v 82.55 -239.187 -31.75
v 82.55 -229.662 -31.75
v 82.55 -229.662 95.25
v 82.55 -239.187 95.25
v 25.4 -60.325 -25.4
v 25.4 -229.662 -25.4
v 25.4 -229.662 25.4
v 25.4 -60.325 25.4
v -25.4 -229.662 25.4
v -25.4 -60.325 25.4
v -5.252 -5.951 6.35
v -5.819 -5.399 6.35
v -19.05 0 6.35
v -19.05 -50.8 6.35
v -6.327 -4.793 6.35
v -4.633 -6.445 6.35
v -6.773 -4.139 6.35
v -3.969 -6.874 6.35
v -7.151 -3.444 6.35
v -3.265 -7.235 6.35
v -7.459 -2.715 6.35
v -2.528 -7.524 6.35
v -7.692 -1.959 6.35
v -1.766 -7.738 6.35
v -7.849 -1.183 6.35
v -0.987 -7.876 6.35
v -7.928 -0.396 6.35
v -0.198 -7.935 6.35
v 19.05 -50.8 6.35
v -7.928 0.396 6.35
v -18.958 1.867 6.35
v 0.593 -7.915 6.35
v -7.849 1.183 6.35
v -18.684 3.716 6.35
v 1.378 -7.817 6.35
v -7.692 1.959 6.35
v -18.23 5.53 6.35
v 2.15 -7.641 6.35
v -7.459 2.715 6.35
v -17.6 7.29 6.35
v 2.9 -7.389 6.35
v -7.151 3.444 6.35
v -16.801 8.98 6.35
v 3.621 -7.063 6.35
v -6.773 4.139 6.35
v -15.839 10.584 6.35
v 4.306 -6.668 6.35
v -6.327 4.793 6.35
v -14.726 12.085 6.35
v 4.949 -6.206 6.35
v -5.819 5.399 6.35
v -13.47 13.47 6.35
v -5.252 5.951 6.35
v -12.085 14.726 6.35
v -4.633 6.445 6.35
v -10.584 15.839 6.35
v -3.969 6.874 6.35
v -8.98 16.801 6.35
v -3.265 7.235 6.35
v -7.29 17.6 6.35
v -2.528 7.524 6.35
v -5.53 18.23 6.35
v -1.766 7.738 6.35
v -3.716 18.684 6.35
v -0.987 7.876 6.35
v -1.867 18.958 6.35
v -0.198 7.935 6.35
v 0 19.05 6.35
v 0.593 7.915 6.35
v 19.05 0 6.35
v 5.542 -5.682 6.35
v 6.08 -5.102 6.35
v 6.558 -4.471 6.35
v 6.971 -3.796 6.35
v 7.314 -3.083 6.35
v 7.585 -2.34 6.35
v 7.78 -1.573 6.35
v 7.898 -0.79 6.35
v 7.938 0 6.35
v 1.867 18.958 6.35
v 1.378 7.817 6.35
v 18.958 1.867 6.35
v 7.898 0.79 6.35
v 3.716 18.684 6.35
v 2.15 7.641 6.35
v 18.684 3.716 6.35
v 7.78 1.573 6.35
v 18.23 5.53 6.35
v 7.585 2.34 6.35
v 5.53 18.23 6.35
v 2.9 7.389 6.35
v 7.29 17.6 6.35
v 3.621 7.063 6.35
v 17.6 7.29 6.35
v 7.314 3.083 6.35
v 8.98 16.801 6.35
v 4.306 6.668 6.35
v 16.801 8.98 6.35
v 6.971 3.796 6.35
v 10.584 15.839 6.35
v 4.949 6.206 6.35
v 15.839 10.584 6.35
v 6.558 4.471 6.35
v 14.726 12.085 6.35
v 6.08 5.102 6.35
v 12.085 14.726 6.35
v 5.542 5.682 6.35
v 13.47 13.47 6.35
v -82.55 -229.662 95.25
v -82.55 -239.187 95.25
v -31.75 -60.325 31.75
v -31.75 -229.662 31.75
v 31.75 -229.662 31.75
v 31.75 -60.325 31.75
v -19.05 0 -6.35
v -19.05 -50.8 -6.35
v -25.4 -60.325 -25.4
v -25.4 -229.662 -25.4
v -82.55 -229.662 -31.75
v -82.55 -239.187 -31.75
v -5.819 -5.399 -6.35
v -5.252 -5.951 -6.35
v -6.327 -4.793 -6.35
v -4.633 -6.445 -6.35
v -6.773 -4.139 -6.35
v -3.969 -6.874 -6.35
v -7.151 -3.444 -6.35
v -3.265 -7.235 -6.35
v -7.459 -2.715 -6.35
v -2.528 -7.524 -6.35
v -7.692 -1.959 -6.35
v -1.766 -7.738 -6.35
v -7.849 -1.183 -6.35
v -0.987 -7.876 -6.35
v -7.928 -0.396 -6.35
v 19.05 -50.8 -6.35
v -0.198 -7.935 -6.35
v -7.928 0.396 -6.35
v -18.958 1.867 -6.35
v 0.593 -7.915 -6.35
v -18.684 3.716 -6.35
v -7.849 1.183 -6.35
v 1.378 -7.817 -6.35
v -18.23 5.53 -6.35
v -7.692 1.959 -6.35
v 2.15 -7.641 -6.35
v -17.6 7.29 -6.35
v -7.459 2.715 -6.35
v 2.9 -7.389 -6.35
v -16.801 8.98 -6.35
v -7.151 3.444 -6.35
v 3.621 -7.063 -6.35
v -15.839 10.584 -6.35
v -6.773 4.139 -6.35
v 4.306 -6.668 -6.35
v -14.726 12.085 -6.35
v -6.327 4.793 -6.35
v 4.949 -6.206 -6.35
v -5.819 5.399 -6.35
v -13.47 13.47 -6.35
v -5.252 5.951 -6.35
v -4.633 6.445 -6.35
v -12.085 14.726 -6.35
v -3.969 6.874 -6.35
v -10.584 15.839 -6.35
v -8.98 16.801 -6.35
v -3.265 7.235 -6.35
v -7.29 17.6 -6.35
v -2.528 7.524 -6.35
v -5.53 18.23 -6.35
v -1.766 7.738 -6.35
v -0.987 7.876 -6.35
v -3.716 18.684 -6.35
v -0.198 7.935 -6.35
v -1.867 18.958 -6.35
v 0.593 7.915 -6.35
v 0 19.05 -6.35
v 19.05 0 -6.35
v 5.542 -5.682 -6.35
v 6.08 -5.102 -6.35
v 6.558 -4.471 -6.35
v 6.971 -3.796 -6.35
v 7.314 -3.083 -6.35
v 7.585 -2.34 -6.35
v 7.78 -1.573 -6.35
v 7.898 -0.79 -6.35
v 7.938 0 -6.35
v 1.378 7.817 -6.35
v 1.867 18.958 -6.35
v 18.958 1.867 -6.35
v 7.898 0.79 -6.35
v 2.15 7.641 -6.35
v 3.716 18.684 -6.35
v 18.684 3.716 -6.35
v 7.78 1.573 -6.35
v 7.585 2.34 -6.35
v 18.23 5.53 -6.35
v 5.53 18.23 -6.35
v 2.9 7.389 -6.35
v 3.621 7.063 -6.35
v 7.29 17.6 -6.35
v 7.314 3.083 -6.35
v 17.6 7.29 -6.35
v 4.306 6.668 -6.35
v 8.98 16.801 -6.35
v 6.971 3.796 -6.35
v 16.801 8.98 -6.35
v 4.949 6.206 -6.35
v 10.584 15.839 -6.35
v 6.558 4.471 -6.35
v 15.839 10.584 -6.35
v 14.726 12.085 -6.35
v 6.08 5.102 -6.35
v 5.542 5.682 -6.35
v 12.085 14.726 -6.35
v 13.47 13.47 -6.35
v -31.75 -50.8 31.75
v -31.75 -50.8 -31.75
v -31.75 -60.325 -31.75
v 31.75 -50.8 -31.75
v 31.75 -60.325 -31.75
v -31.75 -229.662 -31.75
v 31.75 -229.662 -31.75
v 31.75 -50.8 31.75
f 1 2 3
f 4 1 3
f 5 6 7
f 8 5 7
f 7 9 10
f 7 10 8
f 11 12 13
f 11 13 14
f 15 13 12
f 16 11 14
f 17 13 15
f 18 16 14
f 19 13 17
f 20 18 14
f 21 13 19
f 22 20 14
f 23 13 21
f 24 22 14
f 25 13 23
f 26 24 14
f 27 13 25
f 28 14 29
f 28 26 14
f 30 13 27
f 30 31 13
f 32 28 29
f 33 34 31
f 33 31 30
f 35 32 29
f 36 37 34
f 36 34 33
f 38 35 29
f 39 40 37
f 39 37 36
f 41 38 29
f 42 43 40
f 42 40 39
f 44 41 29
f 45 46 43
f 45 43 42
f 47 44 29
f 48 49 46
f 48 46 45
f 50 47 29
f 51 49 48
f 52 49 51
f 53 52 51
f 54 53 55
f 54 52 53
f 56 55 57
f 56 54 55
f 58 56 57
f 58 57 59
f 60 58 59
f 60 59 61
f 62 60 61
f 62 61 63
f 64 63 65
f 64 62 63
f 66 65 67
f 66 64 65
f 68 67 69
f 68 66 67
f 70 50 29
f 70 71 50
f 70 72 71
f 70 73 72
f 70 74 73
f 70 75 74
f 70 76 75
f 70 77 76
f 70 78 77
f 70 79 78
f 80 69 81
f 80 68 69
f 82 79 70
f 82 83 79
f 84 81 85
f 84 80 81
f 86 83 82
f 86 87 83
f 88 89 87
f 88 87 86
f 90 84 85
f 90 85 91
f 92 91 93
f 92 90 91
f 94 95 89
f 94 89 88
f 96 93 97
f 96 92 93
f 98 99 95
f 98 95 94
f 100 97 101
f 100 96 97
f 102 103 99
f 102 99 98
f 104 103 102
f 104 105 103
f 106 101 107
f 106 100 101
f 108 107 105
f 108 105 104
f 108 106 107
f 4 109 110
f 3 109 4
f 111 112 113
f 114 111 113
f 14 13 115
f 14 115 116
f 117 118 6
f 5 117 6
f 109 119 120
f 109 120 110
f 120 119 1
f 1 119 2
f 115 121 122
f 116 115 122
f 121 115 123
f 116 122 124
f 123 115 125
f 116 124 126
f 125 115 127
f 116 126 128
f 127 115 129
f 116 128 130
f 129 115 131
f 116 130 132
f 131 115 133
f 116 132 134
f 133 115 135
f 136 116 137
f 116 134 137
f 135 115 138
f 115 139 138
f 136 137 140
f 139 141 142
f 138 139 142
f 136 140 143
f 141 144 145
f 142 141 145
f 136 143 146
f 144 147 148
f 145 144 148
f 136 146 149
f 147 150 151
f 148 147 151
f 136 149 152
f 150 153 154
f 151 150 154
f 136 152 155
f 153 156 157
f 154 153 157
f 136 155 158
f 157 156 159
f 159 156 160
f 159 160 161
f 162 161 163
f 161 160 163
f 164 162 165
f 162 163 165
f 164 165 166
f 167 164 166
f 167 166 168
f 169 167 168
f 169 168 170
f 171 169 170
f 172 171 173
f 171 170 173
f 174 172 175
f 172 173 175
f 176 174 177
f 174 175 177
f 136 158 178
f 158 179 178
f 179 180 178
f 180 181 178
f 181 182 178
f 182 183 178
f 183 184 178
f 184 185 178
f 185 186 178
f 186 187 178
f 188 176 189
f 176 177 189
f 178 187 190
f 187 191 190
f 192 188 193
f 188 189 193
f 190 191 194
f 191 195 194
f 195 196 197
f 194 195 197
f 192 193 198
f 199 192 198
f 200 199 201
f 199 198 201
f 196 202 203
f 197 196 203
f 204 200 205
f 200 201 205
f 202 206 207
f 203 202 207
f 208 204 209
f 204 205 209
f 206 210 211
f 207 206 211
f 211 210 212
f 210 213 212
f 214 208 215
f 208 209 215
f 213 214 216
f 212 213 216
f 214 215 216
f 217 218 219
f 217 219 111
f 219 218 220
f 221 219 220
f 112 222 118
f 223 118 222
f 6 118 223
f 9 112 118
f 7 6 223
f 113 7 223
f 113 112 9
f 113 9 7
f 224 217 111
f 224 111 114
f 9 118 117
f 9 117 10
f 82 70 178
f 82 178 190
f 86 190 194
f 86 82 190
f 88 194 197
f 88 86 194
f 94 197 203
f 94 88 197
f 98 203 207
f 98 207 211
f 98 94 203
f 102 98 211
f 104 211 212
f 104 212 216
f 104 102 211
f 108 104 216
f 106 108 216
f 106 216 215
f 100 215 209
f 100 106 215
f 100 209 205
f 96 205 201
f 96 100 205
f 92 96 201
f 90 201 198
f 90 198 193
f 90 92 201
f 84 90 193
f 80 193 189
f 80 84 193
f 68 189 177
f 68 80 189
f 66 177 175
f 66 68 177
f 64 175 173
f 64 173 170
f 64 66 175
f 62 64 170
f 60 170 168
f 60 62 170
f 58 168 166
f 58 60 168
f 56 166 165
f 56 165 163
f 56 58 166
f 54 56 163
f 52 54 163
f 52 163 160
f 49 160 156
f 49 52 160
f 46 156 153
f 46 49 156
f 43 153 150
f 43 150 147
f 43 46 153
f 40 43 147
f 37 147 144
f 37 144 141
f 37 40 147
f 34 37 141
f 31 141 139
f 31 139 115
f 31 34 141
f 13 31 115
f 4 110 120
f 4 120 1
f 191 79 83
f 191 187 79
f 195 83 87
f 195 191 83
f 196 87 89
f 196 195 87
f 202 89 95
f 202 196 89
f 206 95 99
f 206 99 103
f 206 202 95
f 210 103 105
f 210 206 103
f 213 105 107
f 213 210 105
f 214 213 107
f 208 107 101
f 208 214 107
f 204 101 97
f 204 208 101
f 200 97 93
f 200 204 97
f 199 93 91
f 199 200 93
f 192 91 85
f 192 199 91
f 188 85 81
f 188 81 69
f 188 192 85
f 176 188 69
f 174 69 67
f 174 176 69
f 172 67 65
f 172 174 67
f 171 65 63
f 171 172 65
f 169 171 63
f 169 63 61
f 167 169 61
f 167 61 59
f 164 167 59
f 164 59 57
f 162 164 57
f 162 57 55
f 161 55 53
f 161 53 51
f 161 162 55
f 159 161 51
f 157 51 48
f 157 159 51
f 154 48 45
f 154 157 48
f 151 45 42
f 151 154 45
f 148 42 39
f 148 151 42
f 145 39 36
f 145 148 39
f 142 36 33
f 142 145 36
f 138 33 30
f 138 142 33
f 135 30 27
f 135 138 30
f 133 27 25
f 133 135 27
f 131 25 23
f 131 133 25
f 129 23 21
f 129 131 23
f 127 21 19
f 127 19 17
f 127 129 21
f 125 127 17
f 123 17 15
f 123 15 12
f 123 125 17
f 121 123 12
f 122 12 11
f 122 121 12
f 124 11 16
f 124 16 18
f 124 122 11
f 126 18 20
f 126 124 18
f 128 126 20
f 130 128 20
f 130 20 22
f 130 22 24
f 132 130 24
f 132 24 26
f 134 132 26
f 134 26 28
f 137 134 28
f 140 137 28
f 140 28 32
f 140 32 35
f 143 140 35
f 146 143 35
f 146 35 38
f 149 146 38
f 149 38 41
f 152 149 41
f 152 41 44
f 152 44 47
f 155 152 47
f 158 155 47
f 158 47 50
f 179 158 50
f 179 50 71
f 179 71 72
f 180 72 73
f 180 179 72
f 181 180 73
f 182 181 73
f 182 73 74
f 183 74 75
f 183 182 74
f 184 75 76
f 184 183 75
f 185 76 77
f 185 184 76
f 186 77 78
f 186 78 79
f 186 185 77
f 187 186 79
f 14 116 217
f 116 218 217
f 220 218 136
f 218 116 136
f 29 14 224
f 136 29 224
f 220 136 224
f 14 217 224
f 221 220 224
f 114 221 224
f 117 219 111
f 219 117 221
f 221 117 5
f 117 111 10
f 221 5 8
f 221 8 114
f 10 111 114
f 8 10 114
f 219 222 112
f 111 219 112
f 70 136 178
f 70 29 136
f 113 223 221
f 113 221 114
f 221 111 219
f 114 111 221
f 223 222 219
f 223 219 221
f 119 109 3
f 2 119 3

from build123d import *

# Parameters (mm, degrees)
F0_R          = 7.9375
F1_DEPTH      = 6.35
F1_DEPTH_BACK = 6.35
F2_W          = 63.5
F2_H          = 63.5
F3_DEPTH      = 9.525
F4_W          = 63.5
F4_H          = 63.5
F4_W_2        = 50.8
F4_H_2        = 50.8
F5_DEPTH      = 169.336644
F6_W          = 165.1
F6_H          = 127
F7_DEPTH      = 9.525


with BuildPart() as f1:
    # F0 (on Top) → F1 (new body, two sides)
    with BuildSketch(Plane.XY) as f1_sk:
        with BuildLine():
            Line((19.05, -50.8), (19.05, 0))
            ThreePointArc((19.05, 0), (0, 19.05), (-19.05, 0))
            Line((-19.05, 0), (-19.05, -50.8))
            Line((-19.05, -50.8), (19.05, -50.8))
        make_face()
        Circle(F0_R, mode=Mode.SUBTRACT)
    extrude(amount=F1_DEPTH)
    extrude(f1_sk.sketch, amount=-F1_DEPTH_BACK)

    # F2 (on face) → F3 (join)
    with BuildSketch(Plane.XZ.offset(50.8)):
        Rectangle(F2_W, F2_H)
    extrude(amount=F3_DEPTH)


with BuildPart() as f5:
    # F4 (on face) → F5 (new body)
    with BuildSketch(Plane.XZ.offset(60.325)):
        Rectangle(F4_W, F4_H)
        Rectangle(F4_W_2, F4_H_2, mode=Mode.SUBTRACT)
    extrude(amount=F5_DEPTH)


with BuildPart() as f7:
    # F6 (on face) → F7 (new body)
    with BuildSketch(Plane.XZ.offset(229.661644)):
        with Locations((0, 31.75)):
            Rectangle(F6_W, F6_H)
    extrude(amount=F7_DEPTH)


solid = Compound([f1.part, f5.part, f7.part])
